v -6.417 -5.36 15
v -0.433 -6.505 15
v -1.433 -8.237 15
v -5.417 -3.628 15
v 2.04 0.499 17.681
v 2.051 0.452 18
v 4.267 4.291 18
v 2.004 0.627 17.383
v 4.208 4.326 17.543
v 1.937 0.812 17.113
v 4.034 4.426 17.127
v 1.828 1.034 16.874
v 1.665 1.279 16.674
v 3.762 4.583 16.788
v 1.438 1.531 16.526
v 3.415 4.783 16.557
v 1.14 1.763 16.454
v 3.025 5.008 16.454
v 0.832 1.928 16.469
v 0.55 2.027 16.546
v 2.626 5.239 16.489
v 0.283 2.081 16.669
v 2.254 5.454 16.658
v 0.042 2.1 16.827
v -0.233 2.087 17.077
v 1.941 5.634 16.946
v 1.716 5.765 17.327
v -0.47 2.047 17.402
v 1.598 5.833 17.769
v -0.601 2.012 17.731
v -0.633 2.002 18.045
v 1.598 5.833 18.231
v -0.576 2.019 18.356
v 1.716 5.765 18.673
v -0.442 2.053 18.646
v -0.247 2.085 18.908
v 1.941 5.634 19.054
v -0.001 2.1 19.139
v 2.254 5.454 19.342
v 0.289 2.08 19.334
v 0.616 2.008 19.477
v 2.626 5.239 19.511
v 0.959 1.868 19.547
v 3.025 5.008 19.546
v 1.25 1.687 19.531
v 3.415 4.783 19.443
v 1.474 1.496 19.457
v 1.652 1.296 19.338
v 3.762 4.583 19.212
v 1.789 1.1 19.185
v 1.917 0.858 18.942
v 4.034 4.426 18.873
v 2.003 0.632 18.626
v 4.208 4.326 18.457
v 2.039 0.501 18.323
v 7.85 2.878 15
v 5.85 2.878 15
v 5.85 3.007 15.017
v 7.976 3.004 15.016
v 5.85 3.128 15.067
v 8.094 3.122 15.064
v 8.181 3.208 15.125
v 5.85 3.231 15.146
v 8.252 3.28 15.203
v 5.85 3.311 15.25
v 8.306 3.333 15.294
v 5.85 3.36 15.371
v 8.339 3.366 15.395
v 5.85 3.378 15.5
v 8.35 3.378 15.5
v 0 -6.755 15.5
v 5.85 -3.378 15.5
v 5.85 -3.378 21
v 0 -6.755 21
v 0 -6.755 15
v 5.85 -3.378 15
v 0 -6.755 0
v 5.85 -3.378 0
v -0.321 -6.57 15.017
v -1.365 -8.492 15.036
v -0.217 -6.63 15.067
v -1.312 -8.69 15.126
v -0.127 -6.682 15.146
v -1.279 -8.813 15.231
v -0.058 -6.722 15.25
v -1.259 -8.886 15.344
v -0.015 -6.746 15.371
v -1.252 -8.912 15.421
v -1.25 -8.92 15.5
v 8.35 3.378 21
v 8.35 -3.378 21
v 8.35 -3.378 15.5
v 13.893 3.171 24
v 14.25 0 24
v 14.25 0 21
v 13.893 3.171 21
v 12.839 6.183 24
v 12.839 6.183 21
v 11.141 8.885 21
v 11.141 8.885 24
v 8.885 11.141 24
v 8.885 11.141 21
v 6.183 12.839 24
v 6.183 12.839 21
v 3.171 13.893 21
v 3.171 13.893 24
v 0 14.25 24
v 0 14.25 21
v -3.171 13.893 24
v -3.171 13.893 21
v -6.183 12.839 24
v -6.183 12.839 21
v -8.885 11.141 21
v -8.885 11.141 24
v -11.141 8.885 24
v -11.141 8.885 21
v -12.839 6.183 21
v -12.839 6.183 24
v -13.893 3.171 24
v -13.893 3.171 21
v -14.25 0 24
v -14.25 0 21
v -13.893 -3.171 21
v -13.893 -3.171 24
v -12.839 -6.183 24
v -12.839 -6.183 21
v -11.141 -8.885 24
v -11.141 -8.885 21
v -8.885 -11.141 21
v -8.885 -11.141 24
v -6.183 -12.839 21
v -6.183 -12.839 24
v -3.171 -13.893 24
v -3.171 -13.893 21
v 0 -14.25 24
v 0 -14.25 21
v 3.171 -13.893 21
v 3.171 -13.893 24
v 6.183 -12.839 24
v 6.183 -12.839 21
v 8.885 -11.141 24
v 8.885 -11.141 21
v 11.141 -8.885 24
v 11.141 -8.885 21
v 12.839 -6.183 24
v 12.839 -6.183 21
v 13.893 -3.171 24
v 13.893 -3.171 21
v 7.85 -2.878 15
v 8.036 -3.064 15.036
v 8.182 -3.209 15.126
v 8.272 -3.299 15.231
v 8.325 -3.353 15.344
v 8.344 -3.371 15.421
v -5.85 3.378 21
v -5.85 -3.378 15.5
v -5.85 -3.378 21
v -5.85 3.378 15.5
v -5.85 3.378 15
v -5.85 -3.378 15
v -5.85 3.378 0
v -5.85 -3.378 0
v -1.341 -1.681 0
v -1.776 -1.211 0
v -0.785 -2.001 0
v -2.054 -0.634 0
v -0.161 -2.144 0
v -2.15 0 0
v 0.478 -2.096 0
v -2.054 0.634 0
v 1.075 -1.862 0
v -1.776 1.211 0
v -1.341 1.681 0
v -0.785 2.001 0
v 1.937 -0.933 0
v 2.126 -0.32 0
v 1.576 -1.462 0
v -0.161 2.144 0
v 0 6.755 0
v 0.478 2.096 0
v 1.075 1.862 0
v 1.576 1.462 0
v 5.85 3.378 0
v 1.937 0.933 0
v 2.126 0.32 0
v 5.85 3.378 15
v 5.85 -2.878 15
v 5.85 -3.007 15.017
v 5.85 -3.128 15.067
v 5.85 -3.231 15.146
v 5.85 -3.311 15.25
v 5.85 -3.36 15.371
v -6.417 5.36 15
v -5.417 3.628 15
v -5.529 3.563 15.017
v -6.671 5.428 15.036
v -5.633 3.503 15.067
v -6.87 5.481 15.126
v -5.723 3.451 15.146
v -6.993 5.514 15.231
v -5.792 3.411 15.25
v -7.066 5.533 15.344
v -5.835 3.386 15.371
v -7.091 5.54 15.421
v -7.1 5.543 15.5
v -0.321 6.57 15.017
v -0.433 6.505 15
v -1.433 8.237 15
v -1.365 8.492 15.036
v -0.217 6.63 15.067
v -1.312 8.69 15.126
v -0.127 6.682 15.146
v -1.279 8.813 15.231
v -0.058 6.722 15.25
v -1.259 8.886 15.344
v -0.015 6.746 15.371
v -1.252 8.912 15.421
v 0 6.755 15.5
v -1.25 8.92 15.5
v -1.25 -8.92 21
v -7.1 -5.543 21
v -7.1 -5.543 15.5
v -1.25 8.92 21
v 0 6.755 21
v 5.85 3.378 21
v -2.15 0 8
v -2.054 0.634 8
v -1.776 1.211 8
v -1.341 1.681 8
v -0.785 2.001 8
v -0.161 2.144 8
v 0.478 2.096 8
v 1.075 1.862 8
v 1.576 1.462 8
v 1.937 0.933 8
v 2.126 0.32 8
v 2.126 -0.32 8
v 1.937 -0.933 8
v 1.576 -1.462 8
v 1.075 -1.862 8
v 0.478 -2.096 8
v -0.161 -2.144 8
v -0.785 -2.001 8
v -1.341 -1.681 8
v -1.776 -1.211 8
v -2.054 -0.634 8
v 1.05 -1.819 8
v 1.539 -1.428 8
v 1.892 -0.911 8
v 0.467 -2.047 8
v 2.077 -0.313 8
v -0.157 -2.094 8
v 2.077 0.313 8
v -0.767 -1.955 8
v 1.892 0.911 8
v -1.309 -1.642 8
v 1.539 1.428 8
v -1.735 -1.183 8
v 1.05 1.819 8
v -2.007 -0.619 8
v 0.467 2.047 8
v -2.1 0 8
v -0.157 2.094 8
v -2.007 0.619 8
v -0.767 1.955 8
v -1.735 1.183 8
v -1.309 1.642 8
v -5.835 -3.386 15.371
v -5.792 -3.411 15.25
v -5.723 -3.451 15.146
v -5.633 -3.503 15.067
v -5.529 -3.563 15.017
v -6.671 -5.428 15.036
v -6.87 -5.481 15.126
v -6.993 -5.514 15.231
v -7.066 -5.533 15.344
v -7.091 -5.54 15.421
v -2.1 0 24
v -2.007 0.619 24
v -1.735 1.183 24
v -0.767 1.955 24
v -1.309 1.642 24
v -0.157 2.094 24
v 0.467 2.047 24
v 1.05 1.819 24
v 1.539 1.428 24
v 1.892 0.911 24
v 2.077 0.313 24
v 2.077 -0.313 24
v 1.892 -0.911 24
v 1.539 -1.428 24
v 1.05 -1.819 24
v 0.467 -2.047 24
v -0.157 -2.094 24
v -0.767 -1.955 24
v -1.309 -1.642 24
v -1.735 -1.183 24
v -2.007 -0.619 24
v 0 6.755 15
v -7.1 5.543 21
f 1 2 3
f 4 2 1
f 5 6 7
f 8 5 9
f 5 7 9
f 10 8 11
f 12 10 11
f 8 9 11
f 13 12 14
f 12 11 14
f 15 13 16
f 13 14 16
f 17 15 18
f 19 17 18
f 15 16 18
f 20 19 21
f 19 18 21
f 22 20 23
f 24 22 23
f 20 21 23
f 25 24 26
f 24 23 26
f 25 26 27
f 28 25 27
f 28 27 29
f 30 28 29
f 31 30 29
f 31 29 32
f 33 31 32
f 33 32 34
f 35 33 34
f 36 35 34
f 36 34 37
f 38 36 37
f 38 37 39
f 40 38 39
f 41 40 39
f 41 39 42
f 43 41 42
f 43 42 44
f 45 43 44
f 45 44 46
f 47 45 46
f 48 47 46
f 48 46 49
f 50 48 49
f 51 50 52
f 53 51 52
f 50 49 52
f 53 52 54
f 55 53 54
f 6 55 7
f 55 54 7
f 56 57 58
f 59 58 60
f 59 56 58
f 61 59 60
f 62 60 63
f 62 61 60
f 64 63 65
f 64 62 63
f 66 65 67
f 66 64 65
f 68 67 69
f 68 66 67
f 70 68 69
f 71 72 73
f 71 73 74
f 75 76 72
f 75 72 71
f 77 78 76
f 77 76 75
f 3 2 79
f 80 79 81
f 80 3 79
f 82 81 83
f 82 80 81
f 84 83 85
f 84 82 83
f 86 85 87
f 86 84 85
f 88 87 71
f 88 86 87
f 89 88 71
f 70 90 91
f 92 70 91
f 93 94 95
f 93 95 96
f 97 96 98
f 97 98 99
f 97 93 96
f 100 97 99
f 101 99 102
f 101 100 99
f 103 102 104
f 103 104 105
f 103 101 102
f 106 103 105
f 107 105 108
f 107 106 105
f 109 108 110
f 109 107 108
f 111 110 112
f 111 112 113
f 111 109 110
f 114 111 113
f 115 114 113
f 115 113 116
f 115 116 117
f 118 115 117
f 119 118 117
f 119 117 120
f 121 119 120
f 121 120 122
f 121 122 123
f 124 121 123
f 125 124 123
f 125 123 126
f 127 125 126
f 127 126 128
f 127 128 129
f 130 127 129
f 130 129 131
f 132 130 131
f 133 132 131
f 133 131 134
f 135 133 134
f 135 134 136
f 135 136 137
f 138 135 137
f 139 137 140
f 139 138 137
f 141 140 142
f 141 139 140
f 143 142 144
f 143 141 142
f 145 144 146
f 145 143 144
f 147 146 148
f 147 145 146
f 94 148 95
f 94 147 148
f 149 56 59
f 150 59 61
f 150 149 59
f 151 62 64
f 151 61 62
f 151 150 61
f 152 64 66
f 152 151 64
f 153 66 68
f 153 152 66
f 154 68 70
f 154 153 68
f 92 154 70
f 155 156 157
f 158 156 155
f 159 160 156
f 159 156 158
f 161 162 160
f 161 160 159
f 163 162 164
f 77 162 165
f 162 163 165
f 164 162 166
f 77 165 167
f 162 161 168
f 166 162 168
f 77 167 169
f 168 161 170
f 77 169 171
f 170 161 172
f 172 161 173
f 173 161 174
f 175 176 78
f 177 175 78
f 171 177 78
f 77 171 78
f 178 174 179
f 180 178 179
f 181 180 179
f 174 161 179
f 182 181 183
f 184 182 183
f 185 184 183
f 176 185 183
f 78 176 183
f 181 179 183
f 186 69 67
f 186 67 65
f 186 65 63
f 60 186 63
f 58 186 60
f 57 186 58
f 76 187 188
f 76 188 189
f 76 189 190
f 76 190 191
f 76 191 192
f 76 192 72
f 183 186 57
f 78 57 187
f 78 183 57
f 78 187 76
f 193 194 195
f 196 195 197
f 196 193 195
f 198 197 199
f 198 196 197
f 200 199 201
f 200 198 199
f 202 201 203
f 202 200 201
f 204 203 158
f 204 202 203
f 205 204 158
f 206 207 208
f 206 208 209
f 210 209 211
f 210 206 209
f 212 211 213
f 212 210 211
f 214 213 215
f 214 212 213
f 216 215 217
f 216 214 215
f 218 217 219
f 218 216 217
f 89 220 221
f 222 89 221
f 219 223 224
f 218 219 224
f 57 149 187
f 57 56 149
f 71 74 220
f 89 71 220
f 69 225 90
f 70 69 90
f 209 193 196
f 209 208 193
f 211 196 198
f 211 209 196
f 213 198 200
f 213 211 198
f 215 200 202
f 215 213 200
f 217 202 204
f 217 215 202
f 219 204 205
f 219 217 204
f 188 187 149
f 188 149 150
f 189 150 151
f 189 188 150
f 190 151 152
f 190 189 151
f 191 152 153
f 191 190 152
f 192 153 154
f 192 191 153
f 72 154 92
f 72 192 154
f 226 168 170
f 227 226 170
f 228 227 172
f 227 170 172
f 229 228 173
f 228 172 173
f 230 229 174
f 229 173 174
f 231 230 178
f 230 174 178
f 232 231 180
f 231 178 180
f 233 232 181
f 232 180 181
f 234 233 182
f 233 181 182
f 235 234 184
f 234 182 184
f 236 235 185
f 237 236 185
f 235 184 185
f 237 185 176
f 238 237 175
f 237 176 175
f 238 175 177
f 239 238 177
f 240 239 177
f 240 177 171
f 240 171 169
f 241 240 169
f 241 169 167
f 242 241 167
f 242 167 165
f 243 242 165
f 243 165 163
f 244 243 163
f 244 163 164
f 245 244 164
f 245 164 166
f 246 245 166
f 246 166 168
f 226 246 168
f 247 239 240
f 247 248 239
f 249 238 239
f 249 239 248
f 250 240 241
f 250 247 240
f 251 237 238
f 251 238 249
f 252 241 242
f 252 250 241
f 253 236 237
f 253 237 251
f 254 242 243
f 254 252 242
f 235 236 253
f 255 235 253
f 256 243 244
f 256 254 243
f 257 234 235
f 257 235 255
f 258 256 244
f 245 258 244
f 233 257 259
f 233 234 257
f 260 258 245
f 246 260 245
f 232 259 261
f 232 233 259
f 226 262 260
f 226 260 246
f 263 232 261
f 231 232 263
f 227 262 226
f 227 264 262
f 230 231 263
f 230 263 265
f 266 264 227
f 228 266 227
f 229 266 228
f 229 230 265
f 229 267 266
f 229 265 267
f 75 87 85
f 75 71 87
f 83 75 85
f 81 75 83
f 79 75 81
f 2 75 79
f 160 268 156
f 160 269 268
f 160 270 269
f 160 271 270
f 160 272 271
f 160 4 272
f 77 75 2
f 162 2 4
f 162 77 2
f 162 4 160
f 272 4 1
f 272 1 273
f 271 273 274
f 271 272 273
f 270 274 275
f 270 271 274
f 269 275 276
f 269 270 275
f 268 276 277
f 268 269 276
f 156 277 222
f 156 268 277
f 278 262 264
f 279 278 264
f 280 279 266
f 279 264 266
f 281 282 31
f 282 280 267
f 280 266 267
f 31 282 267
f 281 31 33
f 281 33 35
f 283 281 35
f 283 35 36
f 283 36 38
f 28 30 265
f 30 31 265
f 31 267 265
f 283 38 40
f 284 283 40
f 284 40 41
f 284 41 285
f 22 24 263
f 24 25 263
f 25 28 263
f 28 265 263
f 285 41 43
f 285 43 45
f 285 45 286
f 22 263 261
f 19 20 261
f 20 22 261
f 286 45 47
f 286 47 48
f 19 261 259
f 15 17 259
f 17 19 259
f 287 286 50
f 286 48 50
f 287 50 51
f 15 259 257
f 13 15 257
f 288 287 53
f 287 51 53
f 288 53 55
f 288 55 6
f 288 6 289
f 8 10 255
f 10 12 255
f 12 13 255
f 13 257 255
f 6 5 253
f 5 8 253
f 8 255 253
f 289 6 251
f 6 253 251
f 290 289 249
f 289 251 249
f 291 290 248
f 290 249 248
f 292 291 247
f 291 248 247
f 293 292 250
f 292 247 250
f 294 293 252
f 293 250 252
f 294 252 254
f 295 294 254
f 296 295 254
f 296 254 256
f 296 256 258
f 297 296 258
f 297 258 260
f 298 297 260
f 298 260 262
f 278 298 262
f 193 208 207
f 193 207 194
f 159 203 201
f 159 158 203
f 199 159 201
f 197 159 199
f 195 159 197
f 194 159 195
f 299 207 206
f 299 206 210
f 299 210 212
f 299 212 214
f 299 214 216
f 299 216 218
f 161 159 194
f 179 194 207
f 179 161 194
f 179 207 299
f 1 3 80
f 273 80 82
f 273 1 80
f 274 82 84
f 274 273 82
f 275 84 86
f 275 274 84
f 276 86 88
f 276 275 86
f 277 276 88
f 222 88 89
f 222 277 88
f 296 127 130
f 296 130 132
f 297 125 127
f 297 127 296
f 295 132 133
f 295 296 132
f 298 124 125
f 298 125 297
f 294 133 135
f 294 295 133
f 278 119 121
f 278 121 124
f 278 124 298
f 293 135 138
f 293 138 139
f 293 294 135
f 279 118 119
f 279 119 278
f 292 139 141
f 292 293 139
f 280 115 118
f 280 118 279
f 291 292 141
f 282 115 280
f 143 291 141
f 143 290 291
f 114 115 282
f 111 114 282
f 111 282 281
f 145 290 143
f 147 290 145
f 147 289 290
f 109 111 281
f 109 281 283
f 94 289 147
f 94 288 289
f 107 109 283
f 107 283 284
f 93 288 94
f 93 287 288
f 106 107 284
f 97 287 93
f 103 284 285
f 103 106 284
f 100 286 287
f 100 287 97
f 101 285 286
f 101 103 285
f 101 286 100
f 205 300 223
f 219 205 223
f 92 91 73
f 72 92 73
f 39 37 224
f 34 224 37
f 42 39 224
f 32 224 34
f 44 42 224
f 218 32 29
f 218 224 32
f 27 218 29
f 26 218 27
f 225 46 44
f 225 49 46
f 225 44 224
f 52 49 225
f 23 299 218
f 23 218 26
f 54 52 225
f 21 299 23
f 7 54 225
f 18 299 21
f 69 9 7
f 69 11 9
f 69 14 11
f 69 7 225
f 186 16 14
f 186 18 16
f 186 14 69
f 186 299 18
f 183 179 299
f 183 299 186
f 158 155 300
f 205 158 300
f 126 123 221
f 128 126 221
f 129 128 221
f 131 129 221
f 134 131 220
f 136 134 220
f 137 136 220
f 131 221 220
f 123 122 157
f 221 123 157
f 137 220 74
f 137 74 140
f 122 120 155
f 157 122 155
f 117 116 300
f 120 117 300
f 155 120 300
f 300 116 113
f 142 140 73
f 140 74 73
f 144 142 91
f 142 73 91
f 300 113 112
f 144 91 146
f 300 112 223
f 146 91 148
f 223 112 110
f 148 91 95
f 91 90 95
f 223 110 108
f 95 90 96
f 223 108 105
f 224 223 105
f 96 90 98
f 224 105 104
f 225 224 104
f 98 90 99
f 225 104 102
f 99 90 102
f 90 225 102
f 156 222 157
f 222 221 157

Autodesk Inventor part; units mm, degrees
ref_plane "YZ Plane" through (0, 0, 0) normal (1, 0, 0) x (0, 1, 0)
ref_plane "XZ Plane" through (0, 0, 0) normal (0, 1, 0) x (-1, 0, 0)
ref_plane "XY Plane" through (0, 0, 0) normal (0, 0, 1) x (1, 0, 0)
sketch "草圖1" plane through (0, 0, 0) normal (0, 0, 1) x (1, 0, 0)
  line L0 (-5.85, 3.3775) -> (0, 6.755)
  line L1 (0, 6.755) -> (5.85, 3.3775)
  line L2 (5.85, 3.3775) -> (5.85, -3.3775)
  line L3 (5.85, -3.3775) -> (0, -6.755)
  line L4 (0, -6.755) -> (-5.85, -3.3775)
  line L5 (-5.85, -3.3775) -> (-5.85, 3.3775)
  point P0 (0, 0)
  point P1 (0, 0)
  dimension "d0" = 11.7
extrude "擠出1" add sketch "草圖1" along normal blind 24
sketch "草圖2" plane through (0, 0, 24) normal (0, 0, 1) x (1, 0, 0)
  circle A0 centre (0, 0) radius 14.25
  dimension "d3" = 28.5
extrude "擠出2" add sketch "草圖2" against normal blind 3
sketch "草圖3" plane through (0, 0, 21) normal (0, 0, -1) x (-1, 0, 0)
  line L0 (5.85, -3.3775) -> (0, -6.755) projected
  line L1 (5.85, 3.3775) -> (5.85, -3.3775) projected
  line L2 (0, 6.755) -> (5.85, 3.3775) projected
  line L3 (-5.85, 3.3775) -> (0, 6.755) projected
  line L4 (-5.85, -3.3775) -> (-5.85, 3.3775) projected
  line L5 (0, -6.755) -> (-5.85, -3.3775) projected
  line L6 (-5.85, 3.3775) -> (0, 6.755) projected
  line L7 (0, 6.755) -> (5.85, 3.3775) projected
  line L8 (0, 6.755) -> (5.85, 3.3775)
  line L9 (5.85, 3.3775) -> (7.1, 5.5426)
  line L10 (7.1, 5.5426) -> (1.25, 8.9201)
  line L11 (1.25, 8.9201) -> (0, 6.755)
  line L12 (-5.85, -3.3775) -> (-5.85, 3.3775)
  line L13 (-5.85, 3.3775) -> (-8.35, 3.3775)
  line L14 (-8.35, 3.3775) -> (-8.35, -3.3775)
  line L15 (-8.35, -3.3775) -> (-5.85, -3.3775)
  line L16 (5.85, -3.3775) -> (0, -6.755)
  line L17 (0, -6.755) -> (1.25, -8.9201)
  line L18 (1.25, -8.9201) -> (7.1, -5.5426)
  line L19 (7.1, -5.5426) -> (5.85, -3.3775)
  point P0 (0, 0)
  point P1 (0, -6.755)
  dimension "d6" = 2.5
  dimension "d9" = 360
extrude "擠出3" add sketch "草圖3" along normal blind 6 contours L19 L18 L17 L0 | L2 L11 L10 L9 | L15 L14 L13 L4
sketch "草圖4" plane through (0, 0, 0) normal (0, 0, -1) x (-1, 0, 0)
  circle A0 centre (0, 0) radius 2.1
  dimension "d13" = 4.2
extrude "擠出4" cut sketch "草圖4" against normal up to surface (24 mm away)
sketch "草圖5" plane through (0, 0, 0) normal (0, 0, -1) x (-1, 0, 0)
  circle A0 centre (0, 0) radius 2.1 projected
  circle A1 centre (0, 0) radius 2.15
  dimension "d16" = 4.3
extrude "擠出5" cut sketch "草圖5" against normal blind 8 contours A0 | A1
sketch "草圖6" plane through (5.85, 3.3775, 15) normal (0.5, 0.866, 0) x (0.866, -0.5, 0)
  line L0 (10.8725, -6) -> (-17.6275, -6) projected
  circle A0 centre (-3.3775, -3) radius 1.5
  line L1 (-3.3775, 19.8) -> (-3.3775, -13.8) projected
  point P0 (-3.3775, 15)
  dimension "d19" = 3
  dimension "d22" = 3
extrude "擠出6" cut sketch "草圖6" against normal blind 6
sketch "草圖7" plane through (5.85, 3.3775, 15) normal (0.5, 0.866, 0) x (0.866, -0.5, 0)
  circle A0 centre (-3.3775, -3) radius 1.5 projected
  circle A1 centre (-3.3775, -3) radius 1.55
  point P0 (-3.3775, 15)
  dimension "d23" = 3.1
extrude "擠出7" cut sketch "草圖7" against normal blind 6 contours A0 | A1
fillet "圓角2" radius 0.5 9 edges at (-4.175, 7.2313, 15) (-0.625, 7.8375, 15) (-6.475, 4.46, 15) (7.1, 3.3775, 15) (8.35, 0, 15) (7.1, -3.3775, 15) (-4.175, -7.2313, 15) (-0.625, -7.8375, 15) (-6.475, -4.46, 15)
properties part number "Coupling_0515"
